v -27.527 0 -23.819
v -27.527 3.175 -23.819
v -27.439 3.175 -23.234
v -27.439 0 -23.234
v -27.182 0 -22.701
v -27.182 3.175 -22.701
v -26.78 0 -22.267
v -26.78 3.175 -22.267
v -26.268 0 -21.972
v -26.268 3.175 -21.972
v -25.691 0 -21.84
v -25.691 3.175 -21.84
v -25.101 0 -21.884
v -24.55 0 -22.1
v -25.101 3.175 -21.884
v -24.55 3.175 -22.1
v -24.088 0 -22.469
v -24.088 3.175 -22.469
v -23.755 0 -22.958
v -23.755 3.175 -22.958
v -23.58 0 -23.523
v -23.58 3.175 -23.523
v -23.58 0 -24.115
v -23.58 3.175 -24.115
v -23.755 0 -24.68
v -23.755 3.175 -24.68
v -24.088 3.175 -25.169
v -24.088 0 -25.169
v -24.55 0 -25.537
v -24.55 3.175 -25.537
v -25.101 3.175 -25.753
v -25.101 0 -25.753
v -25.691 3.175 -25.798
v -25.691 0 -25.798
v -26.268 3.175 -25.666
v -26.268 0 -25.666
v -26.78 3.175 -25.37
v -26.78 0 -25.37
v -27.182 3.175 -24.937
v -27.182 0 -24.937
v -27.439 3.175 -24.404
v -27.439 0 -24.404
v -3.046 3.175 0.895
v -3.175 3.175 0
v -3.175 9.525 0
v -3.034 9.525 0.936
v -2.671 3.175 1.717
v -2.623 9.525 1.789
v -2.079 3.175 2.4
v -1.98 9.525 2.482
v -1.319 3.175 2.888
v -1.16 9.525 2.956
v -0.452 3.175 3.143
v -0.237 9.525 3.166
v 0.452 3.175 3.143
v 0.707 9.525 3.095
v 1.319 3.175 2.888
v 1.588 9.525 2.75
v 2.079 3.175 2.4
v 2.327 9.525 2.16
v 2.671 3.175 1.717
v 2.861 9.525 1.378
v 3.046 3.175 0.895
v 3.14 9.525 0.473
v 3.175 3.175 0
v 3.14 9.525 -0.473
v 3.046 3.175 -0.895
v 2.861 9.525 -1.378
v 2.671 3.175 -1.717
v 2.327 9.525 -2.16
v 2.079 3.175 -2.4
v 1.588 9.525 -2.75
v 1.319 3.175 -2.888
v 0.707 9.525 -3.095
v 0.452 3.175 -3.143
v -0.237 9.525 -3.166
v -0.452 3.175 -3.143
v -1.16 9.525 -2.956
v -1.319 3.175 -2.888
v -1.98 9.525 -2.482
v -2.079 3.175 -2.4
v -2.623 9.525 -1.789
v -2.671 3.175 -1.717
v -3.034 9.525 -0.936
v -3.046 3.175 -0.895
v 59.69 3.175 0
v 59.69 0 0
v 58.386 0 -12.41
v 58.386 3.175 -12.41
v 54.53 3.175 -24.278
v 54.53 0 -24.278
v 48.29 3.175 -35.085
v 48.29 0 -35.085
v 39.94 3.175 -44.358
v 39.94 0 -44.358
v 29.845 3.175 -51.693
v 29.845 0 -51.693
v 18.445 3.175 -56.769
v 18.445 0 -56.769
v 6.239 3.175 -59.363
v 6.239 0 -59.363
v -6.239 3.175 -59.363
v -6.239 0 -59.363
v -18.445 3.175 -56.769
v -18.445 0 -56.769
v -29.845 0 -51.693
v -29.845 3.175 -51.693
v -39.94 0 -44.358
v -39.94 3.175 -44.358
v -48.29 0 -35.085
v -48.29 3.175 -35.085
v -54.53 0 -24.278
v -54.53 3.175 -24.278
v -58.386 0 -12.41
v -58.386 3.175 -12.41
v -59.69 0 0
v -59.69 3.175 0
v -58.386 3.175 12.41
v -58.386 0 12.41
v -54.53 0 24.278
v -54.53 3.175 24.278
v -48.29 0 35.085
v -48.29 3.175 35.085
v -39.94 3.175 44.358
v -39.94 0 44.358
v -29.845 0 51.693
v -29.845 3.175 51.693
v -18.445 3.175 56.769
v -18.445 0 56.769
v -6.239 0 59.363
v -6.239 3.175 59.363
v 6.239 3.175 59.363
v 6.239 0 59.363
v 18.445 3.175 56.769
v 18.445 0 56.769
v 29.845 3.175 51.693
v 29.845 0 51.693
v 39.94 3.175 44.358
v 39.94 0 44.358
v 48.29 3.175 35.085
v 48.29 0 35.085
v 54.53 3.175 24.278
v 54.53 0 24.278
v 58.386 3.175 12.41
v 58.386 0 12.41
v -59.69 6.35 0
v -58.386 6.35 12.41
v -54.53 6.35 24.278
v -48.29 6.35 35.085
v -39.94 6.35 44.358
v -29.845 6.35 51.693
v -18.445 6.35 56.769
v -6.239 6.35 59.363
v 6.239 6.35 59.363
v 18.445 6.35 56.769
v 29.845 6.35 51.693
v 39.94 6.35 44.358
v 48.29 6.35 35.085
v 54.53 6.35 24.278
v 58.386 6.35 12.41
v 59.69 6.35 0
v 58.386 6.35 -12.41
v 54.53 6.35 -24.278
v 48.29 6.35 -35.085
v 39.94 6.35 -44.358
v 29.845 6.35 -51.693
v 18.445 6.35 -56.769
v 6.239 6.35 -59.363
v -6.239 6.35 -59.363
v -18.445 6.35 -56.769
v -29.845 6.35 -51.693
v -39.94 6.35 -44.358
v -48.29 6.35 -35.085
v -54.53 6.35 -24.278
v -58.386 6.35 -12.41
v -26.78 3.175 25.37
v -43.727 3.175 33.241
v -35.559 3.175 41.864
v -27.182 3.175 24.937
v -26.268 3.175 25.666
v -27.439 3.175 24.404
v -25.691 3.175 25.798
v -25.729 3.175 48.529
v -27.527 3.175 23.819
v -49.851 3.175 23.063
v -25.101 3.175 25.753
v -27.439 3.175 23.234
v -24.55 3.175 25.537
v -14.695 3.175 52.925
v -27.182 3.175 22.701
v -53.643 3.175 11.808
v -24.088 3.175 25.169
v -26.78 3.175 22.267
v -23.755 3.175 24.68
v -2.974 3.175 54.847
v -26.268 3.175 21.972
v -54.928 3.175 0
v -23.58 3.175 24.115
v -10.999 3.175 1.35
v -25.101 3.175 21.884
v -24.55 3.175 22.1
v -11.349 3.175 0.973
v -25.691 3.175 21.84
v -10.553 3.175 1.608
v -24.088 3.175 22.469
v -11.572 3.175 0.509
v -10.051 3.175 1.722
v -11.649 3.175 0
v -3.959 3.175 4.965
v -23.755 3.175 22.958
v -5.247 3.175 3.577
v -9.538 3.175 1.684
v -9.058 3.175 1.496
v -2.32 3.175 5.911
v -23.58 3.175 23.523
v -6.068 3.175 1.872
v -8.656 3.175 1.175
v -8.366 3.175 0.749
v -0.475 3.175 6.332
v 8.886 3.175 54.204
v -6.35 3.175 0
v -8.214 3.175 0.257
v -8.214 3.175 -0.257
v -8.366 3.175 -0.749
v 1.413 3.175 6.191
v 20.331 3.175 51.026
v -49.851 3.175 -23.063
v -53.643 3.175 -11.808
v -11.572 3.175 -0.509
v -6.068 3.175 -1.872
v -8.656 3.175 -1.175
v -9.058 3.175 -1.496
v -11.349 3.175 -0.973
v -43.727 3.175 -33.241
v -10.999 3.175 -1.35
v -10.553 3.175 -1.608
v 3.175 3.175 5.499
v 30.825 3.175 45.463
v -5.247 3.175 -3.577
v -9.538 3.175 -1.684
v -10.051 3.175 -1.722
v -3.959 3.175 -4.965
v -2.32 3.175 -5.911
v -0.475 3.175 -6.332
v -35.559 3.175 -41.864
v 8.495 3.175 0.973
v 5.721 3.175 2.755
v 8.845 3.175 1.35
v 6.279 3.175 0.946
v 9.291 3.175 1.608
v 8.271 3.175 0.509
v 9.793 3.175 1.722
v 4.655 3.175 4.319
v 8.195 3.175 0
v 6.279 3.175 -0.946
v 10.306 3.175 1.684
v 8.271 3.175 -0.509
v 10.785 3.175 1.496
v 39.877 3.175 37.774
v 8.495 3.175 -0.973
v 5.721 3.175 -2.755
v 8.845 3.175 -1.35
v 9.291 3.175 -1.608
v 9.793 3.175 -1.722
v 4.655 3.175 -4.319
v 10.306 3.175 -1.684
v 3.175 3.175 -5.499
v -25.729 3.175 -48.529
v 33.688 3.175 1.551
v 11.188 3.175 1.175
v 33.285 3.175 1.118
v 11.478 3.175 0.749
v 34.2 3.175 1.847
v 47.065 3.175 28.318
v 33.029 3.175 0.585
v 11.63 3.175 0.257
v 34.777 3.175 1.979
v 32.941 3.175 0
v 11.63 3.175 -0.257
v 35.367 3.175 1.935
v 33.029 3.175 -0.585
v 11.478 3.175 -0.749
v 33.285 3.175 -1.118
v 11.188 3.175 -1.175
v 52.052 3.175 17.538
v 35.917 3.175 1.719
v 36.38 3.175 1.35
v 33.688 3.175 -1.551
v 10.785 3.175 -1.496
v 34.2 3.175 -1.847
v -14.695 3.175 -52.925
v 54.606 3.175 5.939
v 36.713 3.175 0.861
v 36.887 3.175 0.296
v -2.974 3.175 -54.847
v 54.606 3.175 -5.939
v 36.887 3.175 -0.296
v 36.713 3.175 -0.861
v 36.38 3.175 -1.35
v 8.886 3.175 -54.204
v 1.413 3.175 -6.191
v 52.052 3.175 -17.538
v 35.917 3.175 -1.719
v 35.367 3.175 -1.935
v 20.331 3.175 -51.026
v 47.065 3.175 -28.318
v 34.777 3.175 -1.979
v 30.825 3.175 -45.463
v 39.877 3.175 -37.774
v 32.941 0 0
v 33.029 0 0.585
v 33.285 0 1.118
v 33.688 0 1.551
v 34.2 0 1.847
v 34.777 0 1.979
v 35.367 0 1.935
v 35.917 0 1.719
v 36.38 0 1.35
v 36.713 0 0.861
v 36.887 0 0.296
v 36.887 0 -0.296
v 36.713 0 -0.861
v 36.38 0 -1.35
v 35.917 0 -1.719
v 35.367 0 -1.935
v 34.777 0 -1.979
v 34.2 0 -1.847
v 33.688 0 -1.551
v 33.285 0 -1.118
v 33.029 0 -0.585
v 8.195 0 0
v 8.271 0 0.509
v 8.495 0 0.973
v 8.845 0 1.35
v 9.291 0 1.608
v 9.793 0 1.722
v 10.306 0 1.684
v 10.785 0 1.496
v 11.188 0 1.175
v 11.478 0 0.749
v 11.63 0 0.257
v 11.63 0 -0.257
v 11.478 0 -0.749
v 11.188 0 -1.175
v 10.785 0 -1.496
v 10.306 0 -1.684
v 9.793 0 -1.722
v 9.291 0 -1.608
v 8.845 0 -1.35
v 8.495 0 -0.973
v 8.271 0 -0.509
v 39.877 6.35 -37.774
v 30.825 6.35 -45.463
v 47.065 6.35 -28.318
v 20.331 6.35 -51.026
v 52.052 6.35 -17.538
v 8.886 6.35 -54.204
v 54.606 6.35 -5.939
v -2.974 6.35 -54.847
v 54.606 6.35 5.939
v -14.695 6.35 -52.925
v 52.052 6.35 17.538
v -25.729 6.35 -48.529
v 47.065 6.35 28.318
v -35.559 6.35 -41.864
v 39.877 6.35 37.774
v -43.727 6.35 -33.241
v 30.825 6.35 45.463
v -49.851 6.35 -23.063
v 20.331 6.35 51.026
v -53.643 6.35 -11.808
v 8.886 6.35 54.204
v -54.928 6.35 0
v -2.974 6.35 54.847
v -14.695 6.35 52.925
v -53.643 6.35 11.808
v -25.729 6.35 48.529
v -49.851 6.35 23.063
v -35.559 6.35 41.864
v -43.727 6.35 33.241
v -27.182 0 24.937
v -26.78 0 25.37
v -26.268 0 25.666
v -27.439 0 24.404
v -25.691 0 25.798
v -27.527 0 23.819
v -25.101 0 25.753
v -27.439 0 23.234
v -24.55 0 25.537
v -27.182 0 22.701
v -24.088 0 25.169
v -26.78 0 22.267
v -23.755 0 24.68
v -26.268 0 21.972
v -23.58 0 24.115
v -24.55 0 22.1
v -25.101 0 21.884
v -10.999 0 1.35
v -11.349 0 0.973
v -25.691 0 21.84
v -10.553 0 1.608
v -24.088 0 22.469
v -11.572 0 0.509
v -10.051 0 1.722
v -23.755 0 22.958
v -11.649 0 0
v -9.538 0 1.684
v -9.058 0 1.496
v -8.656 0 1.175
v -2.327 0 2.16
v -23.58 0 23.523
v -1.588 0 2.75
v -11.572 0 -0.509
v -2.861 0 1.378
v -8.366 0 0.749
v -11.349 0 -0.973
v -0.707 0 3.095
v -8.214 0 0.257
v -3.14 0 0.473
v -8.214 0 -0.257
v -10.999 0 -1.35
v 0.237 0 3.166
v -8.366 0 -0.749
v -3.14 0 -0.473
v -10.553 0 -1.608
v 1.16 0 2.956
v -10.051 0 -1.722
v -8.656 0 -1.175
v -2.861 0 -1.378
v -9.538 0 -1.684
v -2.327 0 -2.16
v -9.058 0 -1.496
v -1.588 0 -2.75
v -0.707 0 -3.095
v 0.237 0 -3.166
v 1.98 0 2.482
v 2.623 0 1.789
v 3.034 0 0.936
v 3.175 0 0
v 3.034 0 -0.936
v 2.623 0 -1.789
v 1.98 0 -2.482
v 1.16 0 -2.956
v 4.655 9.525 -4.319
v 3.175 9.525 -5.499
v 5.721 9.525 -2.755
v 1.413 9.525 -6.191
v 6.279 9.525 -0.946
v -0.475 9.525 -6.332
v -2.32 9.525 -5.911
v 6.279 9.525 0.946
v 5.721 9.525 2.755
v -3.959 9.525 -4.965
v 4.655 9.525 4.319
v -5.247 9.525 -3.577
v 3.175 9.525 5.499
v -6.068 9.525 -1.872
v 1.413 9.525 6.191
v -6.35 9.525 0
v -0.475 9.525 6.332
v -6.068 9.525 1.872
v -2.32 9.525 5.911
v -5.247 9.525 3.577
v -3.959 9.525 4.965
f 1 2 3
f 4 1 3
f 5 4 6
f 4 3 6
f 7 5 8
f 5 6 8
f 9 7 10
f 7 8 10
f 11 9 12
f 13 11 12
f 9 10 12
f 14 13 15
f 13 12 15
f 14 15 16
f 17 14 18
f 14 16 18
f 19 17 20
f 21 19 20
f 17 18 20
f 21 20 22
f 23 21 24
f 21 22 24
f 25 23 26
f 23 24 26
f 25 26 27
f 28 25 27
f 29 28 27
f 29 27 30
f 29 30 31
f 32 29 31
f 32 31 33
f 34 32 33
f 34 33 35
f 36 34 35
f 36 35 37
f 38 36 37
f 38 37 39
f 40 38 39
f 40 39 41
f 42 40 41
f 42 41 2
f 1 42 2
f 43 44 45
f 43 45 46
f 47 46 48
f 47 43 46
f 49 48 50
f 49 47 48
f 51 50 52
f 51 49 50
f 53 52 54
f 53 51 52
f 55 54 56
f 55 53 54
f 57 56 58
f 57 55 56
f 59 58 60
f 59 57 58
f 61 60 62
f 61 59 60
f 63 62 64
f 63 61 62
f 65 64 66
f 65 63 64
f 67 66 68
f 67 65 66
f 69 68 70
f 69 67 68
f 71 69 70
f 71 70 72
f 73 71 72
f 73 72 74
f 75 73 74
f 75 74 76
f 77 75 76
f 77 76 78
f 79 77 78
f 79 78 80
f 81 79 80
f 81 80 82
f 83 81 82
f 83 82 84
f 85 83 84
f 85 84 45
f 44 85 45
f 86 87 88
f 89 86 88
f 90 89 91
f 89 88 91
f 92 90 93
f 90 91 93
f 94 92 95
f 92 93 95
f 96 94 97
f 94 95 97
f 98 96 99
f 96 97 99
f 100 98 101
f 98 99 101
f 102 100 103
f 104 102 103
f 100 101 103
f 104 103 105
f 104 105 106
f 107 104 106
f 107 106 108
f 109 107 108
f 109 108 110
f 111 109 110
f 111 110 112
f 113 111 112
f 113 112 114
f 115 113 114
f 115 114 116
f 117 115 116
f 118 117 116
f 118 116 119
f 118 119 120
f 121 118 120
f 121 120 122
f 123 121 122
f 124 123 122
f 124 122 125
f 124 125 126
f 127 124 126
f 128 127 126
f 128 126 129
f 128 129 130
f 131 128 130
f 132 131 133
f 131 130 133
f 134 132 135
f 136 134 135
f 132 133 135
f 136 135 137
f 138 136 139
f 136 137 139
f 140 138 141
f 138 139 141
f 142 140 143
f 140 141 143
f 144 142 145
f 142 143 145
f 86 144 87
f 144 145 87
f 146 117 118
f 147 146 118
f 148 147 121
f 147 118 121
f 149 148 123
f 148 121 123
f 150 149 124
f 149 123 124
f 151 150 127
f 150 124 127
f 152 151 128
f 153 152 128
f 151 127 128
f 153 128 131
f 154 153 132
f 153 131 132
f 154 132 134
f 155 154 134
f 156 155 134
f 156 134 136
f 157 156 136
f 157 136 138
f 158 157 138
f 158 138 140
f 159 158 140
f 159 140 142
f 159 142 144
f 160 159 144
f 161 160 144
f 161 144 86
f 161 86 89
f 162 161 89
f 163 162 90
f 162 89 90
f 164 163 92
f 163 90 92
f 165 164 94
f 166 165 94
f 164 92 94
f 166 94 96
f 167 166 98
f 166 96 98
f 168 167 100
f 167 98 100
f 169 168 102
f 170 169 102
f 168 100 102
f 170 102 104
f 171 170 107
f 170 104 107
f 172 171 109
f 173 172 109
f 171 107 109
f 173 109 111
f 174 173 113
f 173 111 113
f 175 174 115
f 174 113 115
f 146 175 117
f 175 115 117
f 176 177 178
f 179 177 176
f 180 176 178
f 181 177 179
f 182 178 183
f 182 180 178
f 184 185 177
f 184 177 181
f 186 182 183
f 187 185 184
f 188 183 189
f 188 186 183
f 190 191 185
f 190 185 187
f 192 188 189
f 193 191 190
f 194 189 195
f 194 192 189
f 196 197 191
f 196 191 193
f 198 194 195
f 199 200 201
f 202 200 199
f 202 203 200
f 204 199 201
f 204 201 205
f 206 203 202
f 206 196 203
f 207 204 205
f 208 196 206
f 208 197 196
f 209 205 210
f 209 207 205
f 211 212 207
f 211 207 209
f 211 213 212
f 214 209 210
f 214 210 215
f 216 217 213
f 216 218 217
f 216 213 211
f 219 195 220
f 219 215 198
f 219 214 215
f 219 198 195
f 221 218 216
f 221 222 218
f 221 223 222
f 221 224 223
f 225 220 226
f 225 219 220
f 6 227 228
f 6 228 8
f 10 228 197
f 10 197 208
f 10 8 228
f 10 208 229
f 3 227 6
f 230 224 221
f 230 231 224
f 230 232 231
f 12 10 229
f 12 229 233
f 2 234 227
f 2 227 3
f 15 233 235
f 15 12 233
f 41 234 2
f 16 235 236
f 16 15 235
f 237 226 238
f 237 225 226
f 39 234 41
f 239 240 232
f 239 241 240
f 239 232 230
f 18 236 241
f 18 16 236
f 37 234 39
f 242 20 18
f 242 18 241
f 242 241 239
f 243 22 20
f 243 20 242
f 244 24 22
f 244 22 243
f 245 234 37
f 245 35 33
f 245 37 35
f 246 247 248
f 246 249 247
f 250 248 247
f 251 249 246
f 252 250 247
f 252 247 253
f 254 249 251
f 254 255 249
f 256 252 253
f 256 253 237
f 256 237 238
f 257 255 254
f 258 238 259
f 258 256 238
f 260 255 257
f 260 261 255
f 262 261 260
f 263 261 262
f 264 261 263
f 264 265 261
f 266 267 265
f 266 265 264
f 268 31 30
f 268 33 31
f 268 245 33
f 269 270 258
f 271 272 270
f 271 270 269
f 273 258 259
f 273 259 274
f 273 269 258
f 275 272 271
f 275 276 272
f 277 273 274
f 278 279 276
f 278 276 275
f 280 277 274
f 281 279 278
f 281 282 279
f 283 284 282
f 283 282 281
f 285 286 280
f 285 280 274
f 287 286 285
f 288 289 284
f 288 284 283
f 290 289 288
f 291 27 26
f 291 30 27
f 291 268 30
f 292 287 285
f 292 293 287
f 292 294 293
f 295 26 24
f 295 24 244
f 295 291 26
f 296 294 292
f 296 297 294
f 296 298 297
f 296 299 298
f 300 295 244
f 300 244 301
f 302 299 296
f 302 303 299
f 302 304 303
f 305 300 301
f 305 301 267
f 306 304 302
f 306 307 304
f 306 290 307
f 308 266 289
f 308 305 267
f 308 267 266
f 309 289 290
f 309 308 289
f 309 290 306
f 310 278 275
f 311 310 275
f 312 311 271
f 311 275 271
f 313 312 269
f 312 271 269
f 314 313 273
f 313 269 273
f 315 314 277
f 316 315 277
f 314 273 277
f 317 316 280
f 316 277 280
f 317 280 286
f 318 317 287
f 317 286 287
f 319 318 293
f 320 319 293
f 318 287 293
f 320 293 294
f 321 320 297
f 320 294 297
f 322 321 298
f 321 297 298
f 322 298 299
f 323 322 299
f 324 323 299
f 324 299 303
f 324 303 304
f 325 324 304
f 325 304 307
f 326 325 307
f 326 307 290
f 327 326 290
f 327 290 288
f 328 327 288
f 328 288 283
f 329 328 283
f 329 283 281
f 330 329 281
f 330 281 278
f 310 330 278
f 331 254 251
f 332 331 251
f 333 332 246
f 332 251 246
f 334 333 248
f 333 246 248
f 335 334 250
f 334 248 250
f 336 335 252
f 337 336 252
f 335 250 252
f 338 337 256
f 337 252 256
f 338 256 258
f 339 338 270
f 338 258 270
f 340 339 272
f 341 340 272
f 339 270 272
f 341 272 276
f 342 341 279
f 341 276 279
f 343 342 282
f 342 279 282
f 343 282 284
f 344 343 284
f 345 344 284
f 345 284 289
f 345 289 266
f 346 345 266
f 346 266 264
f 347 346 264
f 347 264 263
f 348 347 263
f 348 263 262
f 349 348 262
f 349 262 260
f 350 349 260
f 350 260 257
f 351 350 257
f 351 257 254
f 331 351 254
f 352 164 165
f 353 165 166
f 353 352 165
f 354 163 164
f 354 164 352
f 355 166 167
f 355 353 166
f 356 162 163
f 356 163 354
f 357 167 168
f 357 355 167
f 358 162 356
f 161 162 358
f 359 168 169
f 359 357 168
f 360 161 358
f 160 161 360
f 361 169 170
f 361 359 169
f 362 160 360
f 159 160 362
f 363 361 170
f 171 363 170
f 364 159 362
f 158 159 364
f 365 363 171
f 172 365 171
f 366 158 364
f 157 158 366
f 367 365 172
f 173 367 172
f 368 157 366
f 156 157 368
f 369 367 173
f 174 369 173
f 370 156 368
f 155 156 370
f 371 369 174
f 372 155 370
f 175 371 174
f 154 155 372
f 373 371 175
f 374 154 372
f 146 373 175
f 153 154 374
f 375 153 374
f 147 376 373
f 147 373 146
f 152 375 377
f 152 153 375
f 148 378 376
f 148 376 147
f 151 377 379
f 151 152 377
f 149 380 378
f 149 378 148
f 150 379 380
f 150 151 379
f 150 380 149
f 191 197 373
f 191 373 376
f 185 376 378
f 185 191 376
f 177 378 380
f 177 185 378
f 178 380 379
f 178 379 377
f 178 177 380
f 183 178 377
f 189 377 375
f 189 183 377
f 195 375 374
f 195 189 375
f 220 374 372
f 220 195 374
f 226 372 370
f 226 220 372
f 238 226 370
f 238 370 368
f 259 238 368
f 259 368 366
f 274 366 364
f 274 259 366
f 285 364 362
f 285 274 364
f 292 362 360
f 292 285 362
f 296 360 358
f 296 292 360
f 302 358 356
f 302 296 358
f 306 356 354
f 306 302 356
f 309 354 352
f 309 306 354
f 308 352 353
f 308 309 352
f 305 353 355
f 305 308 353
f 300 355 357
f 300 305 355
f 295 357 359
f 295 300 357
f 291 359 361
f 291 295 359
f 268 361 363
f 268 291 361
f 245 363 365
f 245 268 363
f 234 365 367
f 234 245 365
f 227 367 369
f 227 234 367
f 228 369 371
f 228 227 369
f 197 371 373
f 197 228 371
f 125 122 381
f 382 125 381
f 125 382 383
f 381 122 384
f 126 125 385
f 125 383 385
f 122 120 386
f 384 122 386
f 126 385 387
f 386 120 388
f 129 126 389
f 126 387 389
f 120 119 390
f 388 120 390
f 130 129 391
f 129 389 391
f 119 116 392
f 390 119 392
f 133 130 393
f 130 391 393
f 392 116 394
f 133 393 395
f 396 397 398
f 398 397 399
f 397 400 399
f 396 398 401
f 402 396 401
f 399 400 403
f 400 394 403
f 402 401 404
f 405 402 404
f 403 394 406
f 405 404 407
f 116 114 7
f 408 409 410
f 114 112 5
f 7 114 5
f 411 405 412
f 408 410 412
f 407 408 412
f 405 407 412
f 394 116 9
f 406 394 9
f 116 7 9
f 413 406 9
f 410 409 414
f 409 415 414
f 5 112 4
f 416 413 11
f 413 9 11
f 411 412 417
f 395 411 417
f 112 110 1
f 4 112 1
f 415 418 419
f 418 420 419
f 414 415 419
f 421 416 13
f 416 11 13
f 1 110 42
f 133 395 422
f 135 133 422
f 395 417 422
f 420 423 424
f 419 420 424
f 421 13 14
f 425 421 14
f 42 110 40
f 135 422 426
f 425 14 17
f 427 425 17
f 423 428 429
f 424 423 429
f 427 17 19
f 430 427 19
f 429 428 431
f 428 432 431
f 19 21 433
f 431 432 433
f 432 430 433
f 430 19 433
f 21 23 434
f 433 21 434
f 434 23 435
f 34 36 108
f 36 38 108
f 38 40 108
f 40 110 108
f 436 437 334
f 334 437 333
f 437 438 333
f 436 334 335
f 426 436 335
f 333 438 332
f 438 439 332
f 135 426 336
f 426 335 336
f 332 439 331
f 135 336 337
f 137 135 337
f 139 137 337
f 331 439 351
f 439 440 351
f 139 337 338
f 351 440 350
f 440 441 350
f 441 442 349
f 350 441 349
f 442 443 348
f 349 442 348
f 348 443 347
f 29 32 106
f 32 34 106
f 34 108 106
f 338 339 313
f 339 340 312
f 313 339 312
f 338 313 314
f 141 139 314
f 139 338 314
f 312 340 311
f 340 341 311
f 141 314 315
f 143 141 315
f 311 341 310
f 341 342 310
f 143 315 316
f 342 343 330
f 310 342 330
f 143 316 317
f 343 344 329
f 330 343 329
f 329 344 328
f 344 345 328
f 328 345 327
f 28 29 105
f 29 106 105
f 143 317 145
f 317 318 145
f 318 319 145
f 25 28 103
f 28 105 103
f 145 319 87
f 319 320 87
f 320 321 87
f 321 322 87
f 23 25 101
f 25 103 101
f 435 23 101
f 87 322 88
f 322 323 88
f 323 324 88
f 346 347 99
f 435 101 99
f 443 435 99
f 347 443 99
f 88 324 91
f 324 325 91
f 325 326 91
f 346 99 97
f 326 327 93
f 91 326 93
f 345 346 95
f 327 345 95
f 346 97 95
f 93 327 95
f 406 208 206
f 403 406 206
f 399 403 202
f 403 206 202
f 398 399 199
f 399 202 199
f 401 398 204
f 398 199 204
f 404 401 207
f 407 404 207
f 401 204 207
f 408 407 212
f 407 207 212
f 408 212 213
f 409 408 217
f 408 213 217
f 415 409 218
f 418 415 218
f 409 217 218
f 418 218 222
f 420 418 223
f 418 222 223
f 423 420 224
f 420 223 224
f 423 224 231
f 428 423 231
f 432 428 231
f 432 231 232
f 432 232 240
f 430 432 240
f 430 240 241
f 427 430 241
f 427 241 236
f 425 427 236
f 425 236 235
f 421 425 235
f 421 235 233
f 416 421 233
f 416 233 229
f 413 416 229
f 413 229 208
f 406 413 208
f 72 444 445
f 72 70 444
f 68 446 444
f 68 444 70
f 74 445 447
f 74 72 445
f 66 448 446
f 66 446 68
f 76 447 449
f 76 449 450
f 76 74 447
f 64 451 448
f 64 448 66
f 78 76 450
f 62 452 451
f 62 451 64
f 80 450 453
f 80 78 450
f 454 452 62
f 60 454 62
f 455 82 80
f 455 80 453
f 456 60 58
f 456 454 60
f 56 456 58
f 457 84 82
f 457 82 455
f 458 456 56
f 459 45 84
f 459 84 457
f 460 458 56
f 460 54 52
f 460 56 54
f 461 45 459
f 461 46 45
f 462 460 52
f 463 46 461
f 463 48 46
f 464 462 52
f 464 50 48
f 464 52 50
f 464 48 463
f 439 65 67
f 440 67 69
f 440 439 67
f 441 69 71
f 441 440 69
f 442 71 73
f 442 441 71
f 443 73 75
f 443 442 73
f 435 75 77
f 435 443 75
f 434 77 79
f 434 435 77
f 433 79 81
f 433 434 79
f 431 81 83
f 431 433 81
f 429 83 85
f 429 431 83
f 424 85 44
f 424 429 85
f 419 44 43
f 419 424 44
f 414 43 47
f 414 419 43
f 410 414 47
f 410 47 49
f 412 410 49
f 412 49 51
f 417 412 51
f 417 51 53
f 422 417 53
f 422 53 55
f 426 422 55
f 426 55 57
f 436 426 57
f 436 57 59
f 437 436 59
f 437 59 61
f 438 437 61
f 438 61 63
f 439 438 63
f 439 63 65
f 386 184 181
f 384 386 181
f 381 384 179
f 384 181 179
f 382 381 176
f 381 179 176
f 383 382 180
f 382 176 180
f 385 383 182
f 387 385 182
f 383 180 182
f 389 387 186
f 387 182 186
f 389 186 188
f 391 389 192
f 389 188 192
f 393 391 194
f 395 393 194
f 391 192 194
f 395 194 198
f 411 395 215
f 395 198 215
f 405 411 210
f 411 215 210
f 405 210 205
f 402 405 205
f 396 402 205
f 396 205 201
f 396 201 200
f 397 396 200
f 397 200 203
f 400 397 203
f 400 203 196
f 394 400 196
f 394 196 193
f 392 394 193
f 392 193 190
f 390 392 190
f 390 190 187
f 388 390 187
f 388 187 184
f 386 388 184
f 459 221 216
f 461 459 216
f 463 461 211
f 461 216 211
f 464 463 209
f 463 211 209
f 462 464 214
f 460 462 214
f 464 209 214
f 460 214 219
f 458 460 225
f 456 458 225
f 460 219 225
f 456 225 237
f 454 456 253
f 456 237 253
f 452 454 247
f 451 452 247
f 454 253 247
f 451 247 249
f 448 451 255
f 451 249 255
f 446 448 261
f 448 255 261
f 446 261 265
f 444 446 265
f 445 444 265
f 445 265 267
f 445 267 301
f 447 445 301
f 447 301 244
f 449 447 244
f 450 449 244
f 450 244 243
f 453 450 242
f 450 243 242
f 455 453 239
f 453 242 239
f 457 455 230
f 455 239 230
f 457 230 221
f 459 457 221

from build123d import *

# Parameters (mm, degrees)
SKETCH1_R          = 59.69
SKETCH1_R_2        = 3.175
EXTRUDE1_DEPTH     = 3.175
SKETCH2_R          = 59.69
SKETCH2_R_2        = 54.9275
EXTRUDE2_DEPTH     = 3.175
CUT_EXTRUDE1_REACH = 5.175
SKETCH3_R          = 1.984375
SKETCH3_R_2        = 1.7272
SKETCH4_R          = 6.35
SKETCH4_R_2        = 3.175
EXTRUDE3_DEPTH     = 6.35


with BuildPart() as part:
    # Sketch1 → Extrude1 (new body)
    with BuildSketch(Plane(origin=(0, 0, 0), x_dir=(1, 0, 0), z_dir=(0, 1, 0))):
        Circle(SKETCH1_R)
        Circle(SKETCH1_R_2, mode=Mode.SUBTRACT)
    extrude(amount=EXTRUDE1_DEPTH)

    # Sketch2 → Extrude2 (add)
    with BuildSketch(Plane(origin=(0, 3.175, 0), x_dir=(-1, 0, 0), z_dir=(0, 1, 0))):
        Circle(SKETCH2_R)
        Circle(SKETCH2_R_2, mode=Mode.SUBTRACT)
    extrude(amount=EXTRUDE2_DEPTH)

    # Sketch3 → Cut-Extrude1 (cut, up to next)
    with BuildSketch(Plane(origin=(0, 3.175, 0), x_dir=(-1, 0, 0), z_dir=(0, 1, 0)), mode=Mode.PRIVATE) as cut_extrude1_sk1:
        with Locations((25.542528029, -23.818792725)):
            Circle(SKETCH3_R)
    cut_extrude1_tool1 = extrude(cut_extrude1_sk1.sketch, amount=-CUT_EXTRUDE1_REACH, mode=Mode.PRIVATE) & part.part
    add(cut_extrude1_tool1.solids().sort_by_distance((-25.542528, 3.175, -23.818793))[0], mode=Mode.SUBTRACT)
    # Sketch3 → Cut-Extrude1 (cut, up to next)
    with BuildSketch(Plane(origin=(0, 3.175, 0), x_dir=(-1, 0, 0), z_dir=(0, 1, 0)), mode=Mode.PRIVATE) as cut_extrude1_sk2:
        with Locations((25.542528029, 23.818792725)):
            Circle(SKETCH3_R)
    cut_extrude1_tool2 = extrude(cut_extrude1_sk2.sketch, amount=-CUT_EXTRUDE1_REACH, mode=Mode.PRIVATE) & part.part
    add(cut_extrude1_tool2.solids().sort_by_distance((-25.542528, 3.175, 23.818793))[0], mode=Mode.SUBTRACT)
    # Sketch3 → Cut-Extrude1 (cut, up to next)
    with BuildSketch(Plane(origin=(0, 3.175, 0), x_dir=(-1, 0, 0), z_dir=(0, 1, 0)), mode=Mode.PRIVATE) as cut_extrude1_sk3:
        with Locations((-34.925, 0)):
            Circle(SKETCH3_R)
    cut_extrude1_tool3 = extrude(cut_extrude1_sk3.sketch, amount=-CUT_EXTRUDE1_REACH, mode=Mode.PRIVATE) & part.part
    add(cut_extrude1_tool3.solids().sort_by_distance((34.925, 3.175, 0))[0], mode=Mode.SUBTRACT)
    # Sketch3 → Cut-Extrude1 (cut, up to next)
    with BuildSketch(Plane(origin=(0, 3.175, 0), x_dir=(-1, 0, 0), z_dir=(0, 1, 0)), mode=Mode.PRIVATE) as cut_extrude1_sk4:
        with Locations((-9.921875, 0)):
            Circle(SKETCH3_R_2)
    cut_extrude1_tool4 = extrude(cut_extrude1_sk4.sketch, amount=-CUT_EXTRUDE1_REACH, mode=Mode.PRIVATE) & part.part
    add(cut_extrude1_tool4.solids().sort_by_distance((9.921875, 3.175, 0))[0], mode=Mode.SUBTRACT)
    # Sketch3 → Cut-Extrude1 (cut, up to next)
    with BuildSketch(Plane(origin=(0, 3.175, 0), x_dir=(-1, 0, 0), z_dir=(0, 1, 0)), mode=Mode.PRIVATE) as cut_extrude1_sk5:
        with Locations((9.921875, 0)):
            Circle(SKETCH3_R_2)
    cut_extrude1_tool5 = extrude(cut_extrude1_sk5.sketch, amount=-CUT_EXTRUDE1_REACH, mode=Mode.PRIVATE) & part.part
    add(cut_extrude1_tool5.solids().sort_by_distance((-9.921875, 3.175, 0))[0], mode=Mode.SUBTRACT)

    # Sketch4 → Extrude3 (add)
    with BuildSketch(Plane(origin=(0, 3.175, 0), x_dir=(-1, 0, 0), z_dir=(0, 1, 0))):
        Circle(SKETCH4_R)
        Circle(SKETCH4_R_2, mode=Mode.SUBTRACT)
    extrude(amount=EXTRUDE3_DEPTH)


solid = part.part
